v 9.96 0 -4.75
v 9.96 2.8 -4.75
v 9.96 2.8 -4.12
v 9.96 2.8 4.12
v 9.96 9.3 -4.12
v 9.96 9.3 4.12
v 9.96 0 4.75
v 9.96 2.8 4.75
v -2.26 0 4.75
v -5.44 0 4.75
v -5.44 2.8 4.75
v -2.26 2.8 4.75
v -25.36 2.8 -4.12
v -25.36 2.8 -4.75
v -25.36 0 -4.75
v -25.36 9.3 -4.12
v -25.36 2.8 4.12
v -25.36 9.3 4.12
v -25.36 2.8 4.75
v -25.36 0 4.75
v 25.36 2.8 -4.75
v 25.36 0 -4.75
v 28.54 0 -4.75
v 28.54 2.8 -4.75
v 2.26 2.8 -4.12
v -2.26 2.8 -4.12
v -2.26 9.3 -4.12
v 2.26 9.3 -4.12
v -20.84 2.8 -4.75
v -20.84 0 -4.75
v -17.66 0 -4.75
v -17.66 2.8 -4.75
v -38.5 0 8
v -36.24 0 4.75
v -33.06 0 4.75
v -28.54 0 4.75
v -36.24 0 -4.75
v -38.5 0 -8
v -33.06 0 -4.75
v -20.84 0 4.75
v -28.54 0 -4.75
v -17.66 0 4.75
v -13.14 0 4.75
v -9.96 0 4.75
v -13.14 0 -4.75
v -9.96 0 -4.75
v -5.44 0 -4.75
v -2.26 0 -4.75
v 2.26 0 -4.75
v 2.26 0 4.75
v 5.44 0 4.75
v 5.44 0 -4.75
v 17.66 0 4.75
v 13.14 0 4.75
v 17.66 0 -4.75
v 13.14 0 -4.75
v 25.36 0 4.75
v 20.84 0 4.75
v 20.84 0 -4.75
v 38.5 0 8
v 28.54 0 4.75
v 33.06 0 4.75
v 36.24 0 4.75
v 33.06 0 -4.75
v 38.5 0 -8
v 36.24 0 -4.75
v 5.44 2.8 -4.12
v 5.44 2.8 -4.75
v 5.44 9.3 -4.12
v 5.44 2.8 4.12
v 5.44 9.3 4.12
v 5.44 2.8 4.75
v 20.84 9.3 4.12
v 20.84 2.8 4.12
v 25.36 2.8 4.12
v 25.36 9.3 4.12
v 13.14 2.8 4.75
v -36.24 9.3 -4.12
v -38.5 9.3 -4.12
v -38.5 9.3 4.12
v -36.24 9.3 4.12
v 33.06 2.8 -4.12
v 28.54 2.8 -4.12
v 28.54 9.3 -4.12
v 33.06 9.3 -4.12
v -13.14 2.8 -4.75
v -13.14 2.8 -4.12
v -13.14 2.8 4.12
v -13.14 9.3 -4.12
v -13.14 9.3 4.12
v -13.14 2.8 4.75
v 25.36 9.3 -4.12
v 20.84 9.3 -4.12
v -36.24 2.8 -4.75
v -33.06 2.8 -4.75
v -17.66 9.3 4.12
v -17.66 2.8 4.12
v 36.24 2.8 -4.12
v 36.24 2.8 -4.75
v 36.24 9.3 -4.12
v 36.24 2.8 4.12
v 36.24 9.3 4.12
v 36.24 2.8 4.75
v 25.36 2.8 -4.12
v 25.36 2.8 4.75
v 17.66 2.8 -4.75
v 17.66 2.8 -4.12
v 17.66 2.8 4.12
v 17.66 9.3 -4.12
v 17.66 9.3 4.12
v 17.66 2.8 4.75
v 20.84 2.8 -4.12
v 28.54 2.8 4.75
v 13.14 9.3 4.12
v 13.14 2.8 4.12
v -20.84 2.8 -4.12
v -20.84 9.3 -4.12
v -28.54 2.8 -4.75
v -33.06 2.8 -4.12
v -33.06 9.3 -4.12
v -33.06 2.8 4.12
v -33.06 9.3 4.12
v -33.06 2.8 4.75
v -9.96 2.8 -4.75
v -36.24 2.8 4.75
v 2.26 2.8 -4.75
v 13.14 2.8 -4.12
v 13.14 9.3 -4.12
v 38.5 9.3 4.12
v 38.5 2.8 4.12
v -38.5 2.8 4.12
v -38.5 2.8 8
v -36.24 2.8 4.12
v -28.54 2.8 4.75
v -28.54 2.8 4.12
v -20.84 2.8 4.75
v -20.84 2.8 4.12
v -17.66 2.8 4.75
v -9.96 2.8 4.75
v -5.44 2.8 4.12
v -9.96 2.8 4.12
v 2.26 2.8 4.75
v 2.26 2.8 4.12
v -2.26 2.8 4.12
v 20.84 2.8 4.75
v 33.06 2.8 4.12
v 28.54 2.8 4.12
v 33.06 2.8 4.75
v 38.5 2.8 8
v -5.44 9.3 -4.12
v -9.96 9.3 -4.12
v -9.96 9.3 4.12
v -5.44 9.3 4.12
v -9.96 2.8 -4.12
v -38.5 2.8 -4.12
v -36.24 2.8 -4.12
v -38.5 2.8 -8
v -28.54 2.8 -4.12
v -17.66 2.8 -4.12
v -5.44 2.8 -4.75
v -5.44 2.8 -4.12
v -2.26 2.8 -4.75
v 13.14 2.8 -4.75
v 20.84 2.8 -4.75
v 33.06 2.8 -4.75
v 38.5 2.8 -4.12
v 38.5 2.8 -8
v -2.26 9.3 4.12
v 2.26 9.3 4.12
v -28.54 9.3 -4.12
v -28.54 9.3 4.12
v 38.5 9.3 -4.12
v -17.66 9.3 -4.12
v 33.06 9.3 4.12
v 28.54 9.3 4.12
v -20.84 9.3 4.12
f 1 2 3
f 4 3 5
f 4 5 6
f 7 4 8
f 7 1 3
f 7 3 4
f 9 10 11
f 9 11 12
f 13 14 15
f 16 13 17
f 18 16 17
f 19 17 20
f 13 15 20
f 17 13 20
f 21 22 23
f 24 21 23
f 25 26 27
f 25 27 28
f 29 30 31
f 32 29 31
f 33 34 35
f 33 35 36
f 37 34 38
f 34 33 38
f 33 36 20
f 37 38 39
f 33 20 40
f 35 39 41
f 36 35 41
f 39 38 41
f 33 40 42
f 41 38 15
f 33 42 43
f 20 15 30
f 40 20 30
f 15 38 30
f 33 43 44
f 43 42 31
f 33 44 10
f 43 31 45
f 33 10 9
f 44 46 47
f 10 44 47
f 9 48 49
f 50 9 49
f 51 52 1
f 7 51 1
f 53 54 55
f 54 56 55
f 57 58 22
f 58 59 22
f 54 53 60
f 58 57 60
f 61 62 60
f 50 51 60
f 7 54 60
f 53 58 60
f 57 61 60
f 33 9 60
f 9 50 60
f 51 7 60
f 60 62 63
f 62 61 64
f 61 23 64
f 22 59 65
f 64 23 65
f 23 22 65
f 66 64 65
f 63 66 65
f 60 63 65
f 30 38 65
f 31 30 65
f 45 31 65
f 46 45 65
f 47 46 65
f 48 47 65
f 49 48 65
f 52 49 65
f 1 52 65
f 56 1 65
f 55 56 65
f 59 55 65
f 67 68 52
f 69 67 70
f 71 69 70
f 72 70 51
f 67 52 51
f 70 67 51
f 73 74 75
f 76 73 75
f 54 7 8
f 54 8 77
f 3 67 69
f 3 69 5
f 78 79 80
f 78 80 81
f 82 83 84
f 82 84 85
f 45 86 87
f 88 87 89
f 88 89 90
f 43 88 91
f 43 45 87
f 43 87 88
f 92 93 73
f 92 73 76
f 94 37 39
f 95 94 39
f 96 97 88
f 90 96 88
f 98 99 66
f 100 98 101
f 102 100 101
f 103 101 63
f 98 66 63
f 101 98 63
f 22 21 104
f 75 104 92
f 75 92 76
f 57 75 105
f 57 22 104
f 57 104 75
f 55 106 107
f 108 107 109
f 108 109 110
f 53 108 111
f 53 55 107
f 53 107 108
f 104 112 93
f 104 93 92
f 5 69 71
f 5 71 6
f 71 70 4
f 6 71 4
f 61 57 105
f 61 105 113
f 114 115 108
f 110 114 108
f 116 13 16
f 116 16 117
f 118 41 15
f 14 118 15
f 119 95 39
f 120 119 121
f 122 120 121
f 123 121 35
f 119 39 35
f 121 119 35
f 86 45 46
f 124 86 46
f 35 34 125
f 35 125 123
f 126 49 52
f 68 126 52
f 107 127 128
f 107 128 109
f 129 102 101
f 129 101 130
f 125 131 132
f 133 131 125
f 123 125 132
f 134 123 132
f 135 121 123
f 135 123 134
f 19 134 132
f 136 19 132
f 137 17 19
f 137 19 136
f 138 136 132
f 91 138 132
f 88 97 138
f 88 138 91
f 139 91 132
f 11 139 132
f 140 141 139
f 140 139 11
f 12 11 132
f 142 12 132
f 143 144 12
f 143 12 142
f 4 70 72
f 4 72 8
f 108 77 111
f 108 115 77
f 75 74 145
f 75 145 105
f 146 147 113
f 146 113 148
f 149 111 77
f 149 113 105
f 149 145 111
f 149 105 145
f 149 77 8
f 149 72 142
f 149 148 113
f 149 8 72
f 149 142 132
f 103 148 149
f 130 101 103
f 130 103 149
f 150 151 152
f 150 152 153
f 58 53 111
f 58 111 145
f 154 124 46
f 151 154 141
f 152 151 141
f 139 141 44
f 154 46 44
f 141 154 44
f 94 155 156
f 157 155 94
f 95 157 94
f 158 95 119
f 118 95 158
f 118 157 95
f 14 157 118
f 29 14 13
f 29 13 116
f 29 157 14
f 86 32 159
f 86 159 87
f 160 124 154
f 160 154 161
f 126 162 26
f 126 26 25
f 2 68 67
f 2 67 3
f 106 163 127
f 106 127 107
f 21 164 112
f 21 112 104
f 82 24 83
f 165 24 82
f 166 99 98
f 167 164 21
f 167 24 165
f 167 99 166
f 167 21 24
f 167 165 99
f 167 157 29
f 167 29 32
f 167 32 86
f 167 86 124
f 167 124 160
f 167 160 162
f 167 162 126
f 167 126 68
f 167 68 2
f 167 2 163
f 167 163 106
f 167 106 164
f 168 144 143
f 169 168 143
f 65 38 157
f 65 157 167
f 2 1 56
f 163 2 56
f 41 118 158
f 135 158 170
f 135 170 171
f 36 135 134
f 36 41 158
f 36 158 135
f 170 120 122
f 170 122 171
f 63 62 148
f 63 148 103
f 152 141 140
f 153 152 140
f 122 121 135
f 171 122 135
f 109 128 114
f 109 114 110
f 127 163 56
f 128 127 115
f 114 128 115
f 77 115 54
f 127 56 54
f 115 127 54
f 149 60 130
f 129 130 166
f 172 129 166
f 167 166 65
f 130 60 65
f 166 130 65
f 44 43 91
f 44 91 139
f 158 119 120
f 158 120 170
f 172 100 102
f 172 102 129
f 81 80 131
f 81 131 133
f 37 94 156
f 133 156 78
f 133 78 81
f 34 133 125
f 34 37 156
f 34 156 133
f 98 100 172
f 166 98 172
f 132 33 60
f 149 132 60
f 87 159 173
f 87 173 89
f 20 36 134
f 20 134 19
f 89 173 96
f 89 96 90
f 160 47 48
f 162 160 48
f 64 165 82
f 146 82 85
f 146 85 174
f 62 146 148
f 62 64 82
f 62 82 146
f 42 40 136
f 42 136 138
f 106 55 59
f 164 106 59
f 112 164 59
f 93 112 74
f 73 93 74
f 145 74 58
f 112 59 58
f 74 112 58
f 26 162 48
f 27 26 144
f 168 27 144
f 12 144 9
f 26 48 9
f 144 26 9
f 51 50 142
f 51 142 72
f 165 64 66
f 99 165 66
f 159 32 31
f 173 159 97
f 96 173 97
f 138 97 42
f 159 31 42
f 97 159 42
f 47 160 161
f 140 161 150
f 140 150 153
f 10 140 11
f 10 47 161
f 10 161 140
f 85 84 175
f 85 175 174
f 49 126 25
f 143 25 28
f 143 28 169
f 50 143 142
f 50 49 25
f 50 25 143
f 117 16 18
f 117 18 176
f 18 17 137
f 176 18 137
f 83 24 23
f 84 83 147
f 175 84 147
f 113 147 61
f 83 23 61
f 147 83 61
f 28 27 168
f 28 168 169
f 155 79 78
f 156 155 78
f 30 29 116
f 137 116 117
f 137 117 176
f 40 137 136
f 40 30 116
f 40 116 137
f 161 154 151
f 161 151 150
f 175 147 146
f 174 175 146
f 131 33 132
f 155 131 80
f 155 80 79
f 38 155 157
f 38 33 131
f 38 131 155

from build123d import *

# Parameters (mm, degrees)
SKETCH1_W           = 77
SKETCH1_H           = 16
BOSS_EXTRUDE1_DEPTH = 2.8
SKETCH2_W           = 77
SKETCH2_H           = 8.24
BOSS_EXTRUDE2_DEPTH = 6.5
SKETCH4_W           = 3.18
SKETCH4_H           = 9.5
CUT_EXTRUDE1_DEPTH  = 10.3


with BuildPart() as part:
    # Sketch1 → Boss-Extrude1 (new body)
    with BuildSketch(Plane(origin=(0, 0, 0), x_dir=(1, 0, 0), z_dir=(0, 1, 0))):
        Rectangle(SKETCH1_W, SKETCH1_H)
    extrude(amount=BOSS_EXTRUDE1_DEPTH)

    # Sketch2 → Boss-Extrude2 (add)
    with BuildSketch(Plane(origin=(0, 2.8, 0), x_dir=(1, 0, 0), z_dir=(0, 1, 0))):
        Rectangle(SKETCH2_W, SKETCH2_H)
    extrude(amount=BOSS_EXTRUDE2_DEPTH)

    # Sketch4 → Cut-Extrude1 (cut, through all)
    with BuildSketch(Plane.XZ):
        with Locations((-26.95, 0)):
            Rectangle(SKETCH4_W, SKETCH4_H)
        with Locations((-34.65, 0)):
            Rectangle(SKETCH4_W, SKETCH4_H)
        with Locations((-19.25, 0)):
            Rectangle(SKETCH4_W, SKETCH4_H)
        with Locations((-11.55, 0)):
            Rectangle(SKETCH4_W, SKETCH4_H)
        with Locations((-3.85, 0)):
            Rectangle(SKETCH4_W, SKETCH4_H)
        with Locations((3.85, 0)):
            Rectangle(SKETCH4_W, SKETCH4_H)
        with Locations((11.55, 0)):
            Rectangle(SKETCH4_W, SKETCH4_H)
        with Locations((19.25, 0)):
            Rectangle(SKETCH4_W, SKETCH4_H)
        with Locations((26.95, 0)):
            Rectangle(SKETCH4_W, SKETCH4_H)
        with Locations((34.65, 0)):
            Rectangle(SKETCH4_W, SKETCH4_H)
    extrude(amount=-CUT_EXTRUDE1_DEPTH, mode=Mode.SUBTRACT)


solid = part.part
